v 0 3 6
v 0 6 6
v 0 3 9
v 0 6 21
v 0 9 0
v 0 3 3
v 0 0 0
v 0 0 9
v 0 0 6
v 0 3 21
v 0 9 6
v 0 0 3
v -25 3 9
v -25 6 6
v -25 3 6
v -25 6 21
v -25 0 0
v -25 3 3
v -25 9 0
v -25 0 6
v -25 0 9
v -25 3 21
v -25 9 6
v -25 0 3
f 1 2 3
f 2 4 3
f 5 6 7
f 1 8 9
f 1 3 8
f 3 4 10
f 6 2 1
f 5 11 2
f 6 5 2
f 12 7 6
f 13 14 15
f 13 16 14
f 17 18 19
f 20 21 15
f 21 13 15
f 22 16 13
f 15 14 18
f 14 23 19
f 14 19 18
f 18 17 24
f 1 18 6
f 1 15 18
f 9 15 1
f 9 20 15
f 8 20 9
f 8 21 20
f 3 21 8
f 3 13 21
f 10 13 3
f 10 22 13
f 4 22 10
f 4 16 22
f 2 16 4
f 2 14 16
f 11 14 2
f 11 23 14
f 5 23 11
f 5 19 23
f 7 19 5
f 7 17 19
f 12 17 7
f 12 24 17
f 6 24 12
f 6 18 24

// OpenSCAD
module SimpleCorner(wallWidth = 3,
                    totalWidth = 50,
                    totalHeight = 50,
                    totalDepth = 50)
{
    // back wall
    cube([totalWidth,wallWidth,totalHeight]);
    // side wall
    translate([totalWidth,0,0])
        rotate([0,0,90])
            cube([totalDepth,wallWidth,totalHeight]);
    // base
    translate([0,totalDepth,0])
        rotate([90, 0, 0])
            cube([totalWidth,
                  wallWidth,
                  totalDepth]);
    // back gutter
    translate([0,
               wallWidth*2,
               wallWidth*2])
        rotate([0,90,0])
            cube([wallWidth, 
                  wallWidth, 
                  totalWidth - 2 * wallWidth]);
    // side gutter
    translate([totalWidth - 3*wallWidth,
               totalDepth,
               wallWidth])
        rotate([90,0,0])
            cube([wallWidth, 
                  wallWidth, 
                  totalDepth - (2 * wallWidth)]);
    // gutter fill
    cube(3);
}
module Cone(holeRadius = 3)
{
    centerRadius    = 3;
    centerHeight    = 2;
    masterRadius    = 18;
    totalHeight     = 3;
    tanAlpha        = totalHeight / (masterRadius - centerRadius);
    holeHeight      = tanAlpha * (masterRadius - holeRadius);
    rotate_extrude()
        polygon(points=[
            [0, 0],
            [masterRadius, 0],
            [holeRadius, holeHeight],
            [holeRadius, 1],
            [0, 1]
        ]);
}
module Base(width = 50,
       depth = 50,
       halfHeight = 3)
{
    cube([width, depth, halfHeight]);
    translate([width / 2, depth / 2, halfHeight])
        Cone(3.5);
}

module BasedCorner(wallWidth = 3,
                   width = 50,
                   height = 50,
                   depth = 50)
{
    translate([0, 0, wallWidth])
        union() {
            SimpleCorner(wallWidth, 
                         width, 
                         height - wallWidth, 
                         depth);
            translate([0,0, -wallWidth])
                difference() {
                    cube([width, depth, wallWidth]);
                    translate([width/2, depth/2, -.01])
                        Cone();
            }
        }
}

module top_profile() 
{
    polygon([
        [0, 0],
        [0, 9],
        [6, 9],
        [6, 6],
        [21,6],
        [21,3],
        [9, 3],
        [9, 0],
        [6, 0],
        [6, 3],
        [3, 3],
        [3, 0],
    ]);
}

printBasedCorner = false;
printSimpleCorner = false;
printBase = false;
wall_h=3;
h=50;
d=50;
w=50;

rotate([0,-90,0])
    linear_extrude(25) 
        top_profile();
    

if(printBase) {
    Base(w, d, wall_h );
}
if(printBasedCorner) {
    translate([0, 55, 0])
        BasedCorner(wall_h, w, h, d);
}
if(printSimpleCorner) {
    translate([-55, 0, 0])
        SimpleCorner(wall_h, w, h, d);
}
